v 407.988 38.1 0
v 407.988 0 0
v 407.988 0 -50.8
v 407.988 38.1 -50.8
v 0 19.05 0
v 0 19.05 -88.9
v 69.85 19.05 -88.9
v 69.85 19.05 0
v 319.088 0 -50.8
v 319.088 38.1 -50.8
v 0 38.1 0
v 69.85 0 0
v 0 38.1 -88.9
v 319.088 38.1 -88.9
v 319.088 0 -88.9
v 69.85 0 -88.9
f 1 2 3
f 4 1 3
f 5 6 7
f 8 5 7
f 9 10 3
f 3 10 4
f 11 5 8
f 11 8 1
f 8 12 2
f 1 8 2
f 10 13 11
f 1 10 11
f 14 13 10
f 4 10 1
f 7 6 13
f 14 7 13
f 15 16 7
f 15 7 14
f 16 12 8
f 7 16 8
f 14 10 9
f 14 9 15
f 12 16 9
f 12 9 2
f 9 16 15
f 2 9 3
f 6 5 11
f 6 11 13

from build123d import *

# Parameters (mm, degrees)
SKETCH1_W           = 407.9875
SKETCH1_H           = 88.9
BOSS_EXTRUDE1_DEPTH = 38.1
SKETCH3_W           = 88.9
SKETCH3_H           = 38.1
CUT_EXTRUDE2_DEPTH  = 39.1
SKETCH4_W           = 69.85
SKETCH4_H           = 19.05
CUT_EXTRUDE3_DEPTH  = 89.9


with BuildPart() as part:
    # Sketch1 → Boss-Extrude1 (new body)
    with BuildSketch(Plane(origin=(0, 0, 0), x_dir=(1, 0, 0), z_dir=(0, 1, 0))):
        with Locations((203.99375, 44.45)):
            Rectangle(SKETCH1_W, SKETCH1_H)
    extrude(amount=BOSS_EXTRUDE1_DEPTH)

    # Sketch3 → Cut-Extrude2 (cut, through all)
    with BuildSketch(Plane(origin=(0, 38.1, 0), x_dir=(1, 0, 0), z_dir=(0, 1, 0))):
        with Locations((363.5375, 69.85)):
            Rectangle(SKETCH3_W, SKETCH3_H)
    extrude(amount=-CUT_EXTRUDE2_DEPTH, mode=Mode.SUBTRACT)

    # Sketch4 → Cut-Extrude3 (cut, through all)
    with BuildSketch(Plane.XY):
        with Locations((34.925, 9.525)):
            Rectangle(SKETCH4_W, SKETCH4_H)
    extrude(amount=-CUT_EXTRUDE3_DEPTH, mode=Mode.SUBTRACT)


solid = part.part
